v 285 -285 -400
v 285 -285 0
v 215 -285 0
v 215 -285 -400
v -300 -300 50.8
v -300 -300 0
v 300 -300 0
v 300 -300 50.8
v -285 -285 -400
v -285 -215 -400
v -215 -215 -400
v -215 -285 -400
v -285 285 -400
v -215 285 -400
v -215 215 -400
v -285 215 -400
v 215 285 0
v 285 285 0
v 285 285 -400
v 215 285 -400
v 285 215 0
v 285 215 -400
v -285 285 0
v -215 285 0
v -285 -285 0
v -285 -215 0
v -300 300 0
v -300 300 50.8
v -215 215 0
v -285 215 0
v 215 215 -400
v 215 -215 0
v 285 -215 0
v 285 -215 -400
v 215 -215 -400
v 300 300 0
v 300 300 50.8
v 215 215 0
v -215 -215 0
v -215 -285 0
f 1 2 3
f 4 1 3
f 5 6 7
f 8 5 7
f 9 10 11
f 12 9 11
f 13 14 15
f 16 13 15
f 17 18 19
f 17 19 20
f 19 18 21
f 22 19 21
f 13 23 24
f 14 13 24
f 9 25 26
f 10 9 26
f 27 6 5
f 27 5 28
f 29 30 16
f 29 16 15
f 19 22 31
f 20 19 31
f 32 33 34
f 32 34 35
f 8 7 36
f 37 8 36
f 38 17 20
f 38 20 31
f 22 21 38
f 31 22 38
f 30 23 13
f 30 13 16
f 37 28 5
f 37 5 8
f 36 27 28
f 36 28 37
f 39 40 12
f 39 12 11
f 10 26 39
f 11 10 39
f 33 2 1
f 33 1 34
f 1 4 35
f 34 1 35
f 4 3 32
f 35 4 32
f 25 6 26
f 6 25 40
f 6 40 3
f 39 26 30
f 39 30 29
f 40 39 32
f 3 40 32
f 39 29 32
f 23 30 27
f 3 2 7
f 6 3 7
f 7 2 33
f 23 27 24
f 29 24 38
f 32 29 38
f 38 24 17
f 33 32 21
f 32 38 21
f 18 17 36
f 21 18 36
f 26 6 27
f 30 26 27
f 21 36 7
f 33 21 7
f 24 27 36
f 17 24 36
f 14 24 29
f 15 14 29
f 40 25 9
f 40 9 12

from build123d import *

# Parameters (mm, degrees)
F0_W     = 600
F0_H     = 600
F1_DEPTH = 50.8
F3_W     = 70
F3_H     = 70
F4_DEPTH = 400
F5_COUNT = 4


with BuildPart() as f1:
    # F0 (on Top) → F1 (new body)
    with BuildSketch(Plane.XY):
        Rectangle(F0_W, F0_H)
    extrude(amount=F1_DEPTH)

    # F3 (on Top) → F4 (join)
    with BuildSketch(Plane.XY):
        with Locations((-250, -250)):
            Rectangle(F3_W, F3_H)
    extrude(amount=-F4_DEPTH)

    # F5: F1 ×4 about axis
    f5_axis = Axis((0, 0, -387.7218663692), (0, 0, 1))


with BuildPart() as f1_1:
    add(f1.part)
    for i in range(1, F5_COUNT):
        add(f1.part.rotate(f5_axis, i * 360 / F5_COUNT))


solid = f1_1.part
